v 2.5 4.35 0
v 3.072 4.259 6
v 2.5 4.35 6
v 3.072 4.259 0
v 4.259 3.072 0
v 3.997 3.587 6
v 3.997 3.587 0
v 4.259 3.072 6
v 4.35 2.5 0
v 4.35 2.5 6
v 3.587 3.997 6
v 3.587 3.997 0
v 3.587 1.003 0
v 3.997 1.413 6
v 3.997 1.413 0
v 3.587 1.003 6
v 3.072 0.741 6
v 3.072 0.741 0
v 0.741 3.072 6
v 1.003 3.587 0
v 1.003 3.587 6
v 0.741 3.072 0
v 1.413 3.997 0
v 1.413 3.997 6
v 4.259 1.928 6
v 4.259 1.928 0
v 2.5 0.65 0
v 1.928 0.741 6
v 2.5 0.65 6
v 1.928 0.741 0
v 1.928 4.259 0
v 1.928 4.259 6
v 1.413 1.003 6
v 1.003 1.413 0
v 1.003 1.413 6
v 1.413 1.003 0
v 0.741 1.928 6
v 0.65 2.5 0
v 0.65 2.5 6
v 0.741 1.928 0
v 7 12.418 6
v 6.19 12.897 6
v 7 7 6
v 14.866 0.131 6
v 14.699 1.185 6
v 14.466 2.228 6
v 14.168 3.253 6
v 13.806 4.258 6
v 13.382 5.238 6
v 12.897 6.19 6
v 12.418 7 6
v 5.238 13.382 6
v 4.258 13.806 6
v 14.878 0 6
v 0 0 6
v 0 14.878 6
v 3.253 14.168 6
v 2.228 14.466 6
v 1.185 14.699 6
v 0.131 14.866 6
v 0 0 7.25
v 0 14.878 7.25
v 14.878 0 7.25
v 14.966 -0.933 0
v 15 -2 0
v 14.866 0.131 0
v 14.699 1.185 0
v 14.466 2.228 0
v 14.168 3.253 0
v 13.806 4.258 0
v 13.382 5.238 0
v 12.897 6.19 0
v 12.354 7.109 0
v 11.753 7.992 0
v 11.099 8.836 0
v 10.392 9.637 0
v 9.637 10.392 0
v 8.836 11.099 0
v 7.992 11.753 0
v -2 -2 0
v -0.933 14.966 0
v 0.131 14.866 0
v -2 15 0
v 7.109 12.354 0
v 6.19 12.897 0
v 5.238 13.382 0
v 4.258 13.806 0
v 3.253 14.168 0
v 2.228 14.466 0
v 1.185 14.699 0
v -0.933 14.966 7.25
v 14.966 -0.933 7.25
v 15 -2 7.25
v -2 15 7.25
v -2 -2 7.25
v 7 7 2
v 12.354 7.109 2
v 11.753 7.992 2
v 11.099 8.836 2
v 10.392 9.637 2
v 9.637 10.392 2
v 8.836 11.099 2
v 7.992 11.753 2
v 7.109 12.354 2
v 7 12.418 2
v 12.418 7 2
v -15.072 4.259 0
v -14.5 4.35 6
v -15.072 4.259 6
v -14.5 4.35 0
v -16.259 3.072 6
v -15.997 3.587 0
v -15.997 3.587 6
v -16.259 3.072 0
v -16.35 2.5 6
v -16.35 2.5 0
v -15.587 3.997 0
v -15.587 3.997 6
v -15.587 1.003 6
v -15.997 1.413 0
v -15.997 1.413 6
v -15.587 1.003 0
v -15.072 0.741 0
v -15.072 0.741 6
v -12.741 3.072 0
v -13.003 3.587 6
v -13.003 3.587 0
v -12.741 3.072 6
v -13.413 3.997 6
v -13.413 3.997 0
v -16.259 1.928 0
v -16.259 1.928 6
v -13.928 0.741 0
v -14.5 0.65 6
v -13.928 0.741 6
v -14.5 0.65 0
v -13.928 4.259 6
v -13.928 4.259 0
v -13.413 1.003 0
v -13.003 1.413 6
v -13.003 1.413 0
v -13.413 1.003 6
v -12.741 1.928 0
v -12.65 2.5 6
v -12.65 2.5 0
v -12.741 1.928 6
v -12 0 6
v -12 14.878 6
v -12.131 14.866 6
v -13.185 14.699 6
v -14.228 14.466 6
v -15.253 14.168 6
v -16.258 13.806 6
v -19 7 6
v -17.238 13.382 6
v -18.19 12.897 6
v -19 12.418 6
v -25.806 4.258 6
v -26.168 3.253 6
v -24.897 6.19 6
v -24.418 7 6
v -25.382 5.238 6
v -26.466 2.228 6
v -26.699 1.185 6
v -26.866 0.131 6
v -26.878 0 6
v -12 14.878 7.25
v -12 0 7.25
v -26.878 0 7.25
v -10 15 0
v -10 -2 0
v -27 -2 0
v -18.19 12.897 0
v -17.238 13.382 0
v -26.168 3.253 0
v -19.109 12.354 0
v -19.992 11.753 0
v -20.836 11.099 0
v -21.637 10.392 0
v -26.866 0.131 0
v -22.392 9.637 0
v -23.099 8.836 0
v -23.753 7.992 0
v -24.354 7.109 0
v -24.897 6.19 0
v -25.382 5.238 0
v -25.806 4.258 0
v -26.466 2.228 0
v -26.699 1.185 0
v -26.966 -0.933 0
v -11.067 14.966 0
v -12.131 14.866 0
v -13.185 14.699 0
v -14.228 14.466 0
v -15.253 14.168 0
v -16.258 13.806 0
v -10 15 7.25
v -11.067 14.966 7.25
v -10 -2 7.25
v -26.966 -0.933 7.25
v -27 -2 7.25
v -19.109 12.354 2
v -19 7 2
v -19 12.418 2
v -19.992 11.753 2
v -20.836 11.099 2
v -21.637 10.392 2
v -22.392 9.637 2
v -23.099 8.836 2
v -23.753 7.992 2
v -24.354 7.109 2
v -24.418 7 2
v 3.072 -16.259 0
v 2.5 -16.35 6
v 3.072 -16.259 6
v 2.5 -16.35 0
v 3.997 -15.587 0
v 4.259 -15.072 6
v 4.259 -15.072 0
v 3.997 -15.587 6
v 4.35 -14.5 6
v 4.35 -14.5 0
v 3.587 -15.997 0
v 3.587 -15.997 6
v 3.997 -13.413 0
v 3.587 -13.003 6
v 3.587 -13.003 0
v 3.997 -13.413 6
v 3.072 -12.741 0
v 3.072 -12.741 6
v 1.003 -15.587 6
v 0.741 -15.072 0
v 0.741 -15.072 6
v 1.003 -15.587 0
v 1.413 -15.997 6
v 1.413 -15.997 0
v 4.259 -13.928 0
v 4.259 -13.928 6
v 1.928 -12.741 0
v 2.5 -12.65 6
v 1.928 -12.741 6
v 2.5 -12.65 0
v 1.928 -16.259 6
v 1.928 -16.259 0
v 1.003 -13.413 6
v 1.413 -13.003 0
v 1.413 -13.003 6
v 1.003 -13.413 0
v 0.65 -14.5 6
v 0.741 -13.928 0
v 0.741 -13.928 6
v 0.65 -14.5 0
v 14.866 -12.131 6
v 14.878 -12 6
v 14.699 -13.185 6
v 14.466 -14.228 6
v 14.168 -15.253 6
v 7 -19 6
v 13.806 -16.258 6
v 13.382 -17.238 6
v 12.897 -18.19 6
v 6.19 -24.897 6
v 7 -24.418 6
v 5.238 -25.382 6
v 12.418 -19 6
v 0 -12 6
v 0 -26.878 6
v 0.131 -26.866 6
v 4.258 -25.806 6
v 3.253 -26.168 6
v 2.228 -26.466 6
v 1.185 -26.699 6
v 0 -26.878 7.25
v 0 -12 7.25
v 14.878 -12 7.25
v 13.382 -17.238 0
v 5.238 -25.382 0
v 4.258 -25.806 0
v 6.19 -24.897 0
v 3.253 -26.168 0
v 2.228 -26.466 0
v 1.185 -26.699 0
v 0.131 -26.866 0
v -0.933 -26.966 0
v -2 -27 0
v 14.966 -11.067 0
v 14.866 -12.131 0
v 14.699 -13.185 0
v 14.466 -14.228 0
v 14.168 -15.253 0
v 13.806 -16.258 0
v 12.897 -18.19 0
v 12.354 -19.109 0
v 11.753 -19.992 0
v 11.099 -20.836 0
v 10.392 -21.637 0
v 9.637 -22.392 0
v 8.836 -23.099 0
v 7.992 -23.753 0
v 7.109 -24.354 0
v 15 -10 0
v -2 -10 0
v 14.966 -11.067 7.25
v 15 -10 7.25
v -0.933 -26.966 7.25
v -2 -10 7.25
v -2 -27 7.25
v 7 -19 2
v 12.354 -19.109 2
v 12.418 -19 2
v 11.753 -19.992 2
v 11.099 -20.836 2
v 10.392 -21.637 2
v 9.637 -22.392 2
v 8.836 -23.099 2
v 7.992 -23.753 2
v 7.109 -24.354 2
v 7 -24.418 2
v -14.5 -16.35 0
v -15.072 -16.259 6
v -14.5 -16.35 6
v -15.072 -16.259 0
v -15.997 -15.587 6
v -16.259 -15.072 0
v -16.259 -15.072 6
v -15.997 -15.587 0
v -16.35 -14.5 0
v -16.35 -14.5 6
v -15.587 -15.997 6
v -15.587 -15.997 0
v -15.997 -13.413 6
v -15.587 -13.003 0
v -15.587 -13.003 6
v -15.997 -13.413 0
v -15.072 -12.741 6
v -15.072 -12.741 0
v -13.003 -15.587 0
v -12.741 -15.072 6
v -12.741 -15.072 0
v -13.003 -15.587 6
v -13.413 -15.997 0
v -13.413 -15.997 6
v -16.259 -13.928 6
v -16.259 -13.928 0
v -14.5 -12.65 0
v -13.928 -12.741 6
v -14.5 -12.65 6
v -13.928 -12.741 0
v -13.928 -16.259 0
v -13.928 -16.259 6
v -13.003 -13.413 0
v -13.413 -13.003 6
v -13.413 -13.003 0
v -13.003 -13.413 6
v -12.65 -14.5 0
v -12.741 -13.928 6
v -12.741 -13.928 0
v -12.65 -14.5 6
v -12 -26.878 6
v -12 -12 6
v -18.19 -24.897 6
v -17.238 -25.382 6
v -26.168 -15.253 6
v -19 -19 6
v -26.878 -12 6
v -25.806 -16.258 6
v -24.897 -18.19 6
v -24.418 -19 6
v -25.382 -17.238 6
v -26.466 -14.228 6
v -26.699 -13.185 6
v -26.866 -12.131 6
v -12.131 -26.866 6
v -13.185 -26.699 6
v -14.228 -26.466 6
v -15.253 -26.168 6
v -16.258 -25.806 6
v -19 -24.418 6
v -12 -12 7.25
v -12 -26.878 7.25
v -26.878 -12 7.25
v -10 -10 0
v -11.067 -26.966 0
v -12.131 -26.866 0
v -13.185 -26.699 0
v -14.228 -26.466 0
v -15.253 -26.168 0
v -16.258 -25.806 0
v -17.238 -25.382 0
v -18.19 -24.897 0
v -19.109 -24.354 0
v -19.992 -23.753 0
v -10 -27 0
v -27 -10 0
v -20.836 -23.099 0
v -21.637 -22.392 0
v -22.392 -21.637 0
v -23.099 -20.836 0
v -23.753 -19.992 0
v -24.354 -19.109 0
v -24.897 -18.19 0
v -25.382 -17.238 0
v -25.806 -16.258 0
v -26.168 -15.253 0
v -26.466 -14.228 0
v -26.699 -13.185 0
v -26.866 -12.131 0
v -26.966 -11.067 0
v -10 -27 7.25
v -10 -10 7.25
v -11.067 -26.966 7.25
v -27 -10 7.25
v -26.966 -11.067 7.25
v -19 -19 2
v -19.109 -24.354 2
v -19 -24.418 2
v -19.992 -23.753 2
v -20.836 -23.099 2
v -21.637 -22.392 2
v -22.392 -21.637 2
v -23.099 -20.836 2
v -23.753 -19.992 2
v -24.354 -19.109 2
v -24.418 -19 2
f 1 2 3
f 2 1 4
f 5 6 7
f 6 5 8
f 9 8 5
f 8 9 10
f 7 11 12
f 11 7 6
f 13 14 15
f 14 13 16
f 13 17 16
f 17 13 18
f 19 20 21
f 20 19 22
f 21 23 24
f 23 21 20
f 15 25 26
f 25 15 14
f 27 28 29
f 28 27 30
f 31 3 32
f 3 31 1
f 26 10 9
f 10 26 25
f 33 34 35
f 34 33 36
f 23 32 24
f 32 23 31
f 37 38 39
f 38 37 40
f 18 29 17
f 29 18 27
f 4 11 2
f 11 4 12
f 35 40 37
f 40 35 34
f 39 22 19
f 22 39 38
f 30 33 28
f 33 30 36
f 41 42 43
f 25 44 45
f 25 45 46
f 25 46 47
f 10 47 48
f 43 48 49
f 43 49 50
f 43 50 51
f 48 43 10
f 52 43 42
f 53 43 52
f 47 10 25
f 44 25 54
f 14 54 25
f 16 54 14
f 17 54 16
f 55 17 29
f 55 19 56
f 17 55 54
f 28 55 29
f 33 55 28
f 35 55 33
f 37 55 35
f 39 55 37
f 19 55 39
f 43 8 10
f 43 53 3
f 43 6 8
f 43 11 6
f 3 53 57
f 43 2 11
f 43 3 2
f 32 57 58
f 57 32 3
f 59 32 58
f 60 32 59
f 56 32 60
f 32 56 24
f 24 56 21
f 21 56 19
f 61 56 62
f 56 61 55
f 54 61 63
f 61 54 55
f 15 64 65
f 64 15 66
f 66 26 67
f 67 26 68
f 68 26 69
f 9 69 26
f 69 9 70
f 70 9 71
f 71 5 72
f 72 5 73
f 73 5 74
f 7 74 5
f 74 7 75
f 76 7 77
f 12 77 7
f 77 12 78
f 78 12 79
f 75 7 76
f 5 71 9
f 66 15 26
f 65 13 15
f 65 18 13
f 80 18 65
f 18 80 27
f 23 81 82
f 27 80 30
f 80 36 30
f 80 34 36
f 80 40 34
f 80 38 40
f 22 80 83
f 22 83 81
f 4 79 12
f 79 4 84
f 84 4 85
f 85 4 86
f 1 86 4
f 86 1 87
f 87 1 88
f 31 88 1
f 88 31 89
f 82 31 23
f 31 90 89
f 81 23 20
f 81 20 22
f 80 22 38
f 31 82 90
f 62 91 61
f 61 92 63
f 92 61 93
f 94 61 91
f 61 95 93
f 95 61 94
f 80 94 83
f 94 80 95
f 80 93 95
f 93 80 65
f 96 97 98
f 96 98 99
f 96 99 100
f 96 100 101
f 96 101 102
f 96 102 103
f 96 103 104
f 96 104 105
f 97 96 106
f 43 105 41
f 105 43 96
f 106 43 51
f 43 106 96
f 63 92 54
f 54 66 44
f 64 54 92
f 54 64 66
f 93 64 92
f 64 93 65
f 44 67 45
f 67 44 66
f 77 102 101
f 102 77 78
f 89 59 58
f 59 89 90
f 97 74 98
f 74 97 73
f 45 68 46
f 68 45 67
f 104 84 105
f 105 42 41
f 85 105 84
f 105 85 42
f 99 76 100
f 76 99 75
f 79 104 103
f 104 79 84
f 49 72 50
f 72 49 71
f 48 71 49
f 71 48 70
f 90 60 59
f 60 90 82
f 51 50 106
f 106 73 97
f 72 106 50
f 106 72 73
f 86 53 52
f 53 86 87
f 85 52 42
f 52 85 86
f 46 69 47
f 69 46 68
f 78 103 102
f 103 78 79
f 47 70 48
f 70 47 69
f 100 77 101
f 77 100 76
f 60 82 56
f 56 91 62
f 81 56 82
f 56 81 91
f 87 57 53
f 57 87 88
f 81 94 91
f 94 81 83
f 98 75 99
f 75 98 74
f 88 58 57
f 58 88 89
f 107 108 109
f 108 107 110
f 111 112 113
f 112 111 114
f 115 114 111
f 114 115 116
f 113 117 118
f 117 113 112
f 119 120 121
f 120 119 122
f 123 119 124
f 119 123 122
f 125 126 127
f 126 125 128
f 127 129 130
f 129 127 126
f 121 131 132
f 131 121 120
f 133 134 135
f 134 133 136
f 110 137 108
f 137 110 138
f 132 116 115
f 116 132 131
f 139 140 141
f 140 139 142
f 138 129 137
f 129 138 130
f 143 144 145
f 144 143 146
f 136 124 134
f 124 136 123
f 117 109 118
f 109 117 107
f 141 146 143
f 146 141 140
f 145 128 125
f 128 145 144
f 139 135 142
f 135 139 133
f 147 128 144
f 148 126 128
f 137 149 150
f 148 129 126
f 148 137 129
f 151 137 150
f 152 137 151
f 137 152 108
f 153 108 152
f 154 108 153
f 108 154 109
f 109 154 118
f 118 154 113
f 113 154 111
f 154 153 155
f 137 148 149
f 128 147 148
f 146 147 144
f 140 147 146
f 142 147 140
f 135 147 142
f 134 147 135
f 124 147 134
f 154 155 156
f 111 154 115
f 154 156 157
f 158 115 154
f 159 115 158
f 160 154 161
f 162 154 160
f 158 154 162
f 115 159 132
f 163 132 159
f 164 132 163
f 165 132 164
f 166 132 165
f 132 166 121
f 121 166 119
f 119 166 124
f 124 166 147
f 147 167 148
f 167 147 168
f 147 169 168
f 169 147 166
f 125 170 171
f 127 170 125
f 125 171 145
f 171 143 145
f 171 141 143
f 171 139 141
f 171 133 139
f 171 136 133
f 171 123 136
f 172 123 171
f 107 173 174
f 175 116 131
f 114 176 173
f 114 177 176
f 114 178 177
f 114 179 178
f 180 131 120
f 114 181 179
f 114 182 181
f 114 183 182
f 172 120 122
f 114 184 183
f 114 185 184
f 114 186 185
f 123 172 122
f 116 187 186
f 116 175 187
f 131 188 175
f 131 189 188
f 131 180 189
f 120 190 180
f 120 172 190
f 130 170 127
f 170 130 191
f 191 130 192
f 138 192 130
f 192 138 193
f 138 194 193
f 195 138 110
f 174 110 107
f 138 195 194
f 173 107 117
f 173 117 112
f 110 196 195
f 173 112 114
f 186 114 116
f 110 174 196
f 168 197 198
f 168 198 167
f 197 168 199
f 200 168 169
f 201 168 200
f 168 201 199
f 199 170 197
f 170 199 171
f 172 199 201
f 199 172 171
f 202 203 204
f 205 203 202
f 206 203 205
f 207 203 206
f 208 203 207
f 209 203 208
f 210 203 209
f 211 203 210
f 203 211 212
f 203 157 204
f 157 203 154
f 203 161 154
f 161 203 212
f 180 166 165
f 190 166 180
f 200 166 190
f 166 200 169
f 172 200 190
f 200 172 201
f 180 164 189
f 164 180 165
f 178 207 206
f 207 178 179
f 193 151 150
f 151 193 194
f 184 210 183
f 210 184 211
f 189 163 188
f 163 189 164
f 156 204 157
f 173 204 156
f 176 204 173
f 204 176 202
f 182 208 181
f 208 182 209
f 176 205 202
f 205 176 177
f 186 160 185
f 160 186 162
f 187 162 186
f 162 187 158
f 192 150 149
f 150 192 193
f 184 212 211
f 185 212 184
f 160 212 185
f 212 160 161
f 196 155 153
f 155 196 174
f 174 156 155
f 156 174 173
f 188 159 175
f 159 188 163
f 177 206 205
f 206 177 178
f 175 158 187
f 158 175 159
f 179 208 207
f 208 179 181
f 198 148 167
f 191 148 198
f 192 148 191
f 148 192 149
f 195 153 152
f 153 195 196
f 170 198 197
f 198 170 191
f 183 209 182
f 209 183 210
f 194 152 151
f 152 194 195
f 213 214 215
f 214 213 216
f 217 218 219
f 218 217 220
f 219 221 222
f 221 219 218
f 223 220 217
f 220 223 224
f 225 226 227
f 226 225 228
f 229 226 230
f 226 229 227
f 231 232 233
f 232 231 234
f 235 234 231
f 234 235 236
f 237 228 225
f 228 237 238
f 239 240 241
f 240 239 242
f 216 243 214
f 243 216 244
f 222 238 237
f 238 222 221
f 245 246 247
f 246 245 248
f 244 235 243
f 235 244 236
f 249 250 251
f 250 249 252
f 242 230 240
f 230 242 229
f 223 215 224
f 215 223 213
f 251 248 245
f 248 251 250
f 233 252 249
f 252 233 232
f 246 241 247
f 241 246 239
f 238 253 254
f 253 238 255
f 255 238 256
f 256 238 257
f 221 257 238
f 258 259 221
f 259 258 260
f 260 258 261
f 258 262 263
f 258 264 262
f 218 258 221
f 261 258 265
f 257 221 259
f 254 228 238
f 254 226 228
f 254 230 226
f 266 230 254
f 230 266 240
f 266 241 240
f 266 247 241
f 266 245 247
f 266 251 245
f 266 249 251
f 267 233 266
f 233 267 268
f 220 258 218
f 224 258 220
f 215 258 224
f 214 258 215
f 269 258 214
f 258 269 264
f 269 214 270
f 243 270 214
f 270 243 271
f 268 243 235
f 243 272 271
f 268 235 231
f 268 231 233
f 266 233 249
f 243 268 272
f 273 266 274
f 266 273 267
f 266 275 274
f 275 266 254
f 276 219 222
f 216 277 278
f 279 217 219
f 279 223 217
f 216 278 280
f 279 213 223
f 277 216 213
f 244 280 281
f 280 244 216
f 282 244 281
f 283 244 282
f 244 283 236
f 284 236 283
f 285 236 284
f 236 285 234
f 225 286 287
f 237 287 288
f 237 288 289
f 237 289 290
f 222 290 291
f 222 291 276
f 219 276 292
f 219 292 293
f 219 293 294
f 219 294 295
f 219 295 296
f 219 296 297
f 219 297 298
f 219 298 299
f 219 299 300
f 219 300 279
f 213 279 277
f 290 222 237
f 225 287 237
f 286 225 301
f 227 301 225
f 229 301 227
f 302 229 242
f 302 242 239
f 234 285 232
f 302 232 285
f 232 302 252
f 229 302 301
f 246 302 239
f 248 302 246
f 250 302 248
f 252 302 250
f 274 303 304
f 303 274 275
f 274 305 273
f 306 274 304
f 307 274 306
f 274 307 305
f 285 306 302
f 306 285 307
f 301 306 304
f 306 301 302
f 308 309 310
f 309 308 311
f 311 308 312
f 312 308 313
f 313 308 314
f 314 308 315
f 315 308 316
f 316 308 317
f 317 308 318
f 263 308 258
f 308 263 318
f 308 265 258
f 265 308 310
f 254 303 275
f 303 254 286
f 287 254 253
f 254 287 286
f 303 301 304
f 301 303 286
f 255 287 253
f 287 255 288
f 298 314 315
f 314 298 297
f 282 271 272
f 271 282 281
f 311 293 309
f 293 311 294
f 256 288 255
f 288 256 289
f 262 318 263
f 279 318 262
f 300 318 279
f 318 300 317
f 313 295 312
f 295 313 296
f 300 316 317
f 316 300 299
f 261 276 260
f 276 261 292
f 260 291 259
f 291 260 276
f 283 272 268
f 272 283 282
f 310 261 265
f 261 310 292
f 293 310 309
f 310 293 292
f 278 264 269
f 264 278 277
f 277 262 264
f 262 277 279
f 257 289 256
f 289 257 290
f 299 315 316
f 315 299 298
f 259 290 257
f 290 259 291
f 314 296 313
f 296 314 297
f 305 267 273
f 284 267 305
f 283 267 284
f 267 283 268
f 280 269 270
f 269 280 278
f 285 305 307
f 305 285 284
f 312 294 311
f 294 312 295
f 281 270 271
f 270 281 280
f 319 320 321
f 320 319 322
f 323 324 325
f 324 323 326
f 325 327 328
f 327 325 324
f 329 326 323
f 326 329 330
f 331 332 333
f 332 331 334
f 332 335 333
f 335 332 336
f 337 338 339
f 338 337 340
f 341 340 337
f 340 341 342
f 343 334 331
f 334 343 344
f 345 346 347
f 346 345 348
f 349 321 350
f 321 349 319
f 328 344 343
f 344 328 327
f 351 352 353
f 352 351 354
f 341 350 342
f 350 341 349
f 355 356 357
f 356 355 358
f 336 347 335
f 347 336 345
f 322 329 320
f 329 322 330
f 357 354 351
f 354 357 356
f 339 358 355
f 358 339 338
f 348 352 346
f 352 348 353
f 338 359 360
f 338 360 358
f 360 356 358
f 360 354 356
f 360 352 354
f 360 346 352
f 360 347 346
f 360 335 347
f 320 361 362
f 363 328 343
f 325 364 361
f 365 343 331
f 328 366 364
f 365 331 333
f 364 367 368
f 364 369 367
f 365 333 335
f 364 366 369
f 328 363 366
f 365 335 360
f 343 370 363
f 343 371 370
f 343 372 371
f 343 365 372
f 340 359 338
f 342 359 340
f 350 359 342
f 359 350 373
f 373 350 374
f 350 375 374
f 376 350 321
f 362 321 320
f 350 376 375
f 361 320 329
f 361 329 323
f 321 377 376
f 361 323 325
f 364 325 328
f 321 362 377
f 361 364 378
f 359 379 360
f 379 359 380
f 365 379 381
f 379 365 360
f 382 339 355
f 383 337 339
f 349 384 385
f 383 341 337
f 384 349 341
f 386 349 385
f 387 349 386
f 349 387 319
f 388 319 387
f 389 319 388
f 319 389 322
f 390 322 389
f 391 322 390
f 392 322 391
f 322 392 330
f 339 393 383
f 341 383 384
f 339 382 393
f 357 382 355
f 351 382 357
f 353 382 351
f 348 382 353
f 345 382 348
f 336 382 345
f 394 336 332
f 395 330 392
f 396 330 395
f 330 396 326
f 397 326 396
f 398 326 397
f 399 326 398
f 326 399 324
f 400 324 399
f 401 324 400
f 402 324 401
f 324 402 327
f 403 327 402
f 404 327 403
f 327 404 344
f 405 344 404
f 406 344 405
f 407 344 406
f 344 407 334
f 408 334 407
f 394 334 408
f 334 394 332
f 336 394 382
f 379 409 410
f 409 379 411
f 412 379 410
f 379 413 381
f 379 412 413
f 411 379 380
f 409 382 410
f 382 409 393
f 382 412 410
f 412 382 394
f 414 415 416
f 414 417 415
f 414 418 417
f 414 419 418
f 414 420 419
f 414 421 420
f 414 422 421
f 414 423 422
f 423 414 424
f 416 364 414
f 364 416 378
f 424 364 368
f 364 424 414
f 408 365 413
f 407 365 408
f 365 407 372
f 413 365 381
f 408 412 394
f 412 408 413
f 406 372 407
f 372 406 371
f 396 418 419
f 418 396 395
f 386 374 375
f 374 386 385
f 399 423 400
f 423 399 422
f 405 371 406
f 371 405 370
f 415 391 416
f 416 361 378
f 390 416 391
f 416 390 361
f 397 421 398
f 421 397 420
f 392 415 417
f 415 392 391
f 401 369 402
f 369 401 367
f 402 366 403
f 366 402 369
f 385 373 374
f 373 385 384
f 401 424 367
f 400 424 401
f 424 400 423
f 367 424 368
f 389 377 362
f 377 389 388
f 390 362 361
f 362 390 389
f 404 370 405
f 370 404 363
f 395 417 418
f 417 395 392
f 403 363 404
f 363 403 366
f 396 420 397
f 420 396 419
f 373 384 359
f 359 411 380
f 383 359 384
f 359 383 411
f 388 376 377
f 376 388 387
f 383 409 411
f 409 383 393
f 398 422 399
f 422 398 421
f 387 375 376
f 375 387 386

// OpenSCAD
/* [HeatedBed] */

hotBedThickness = 2.5;
hotBedSizeX = 214; 
hotBedSizeY = 214; 
hotBedMountPointX = 2.5;
hotBedMountPointY = 2.5;
hotBedMountPointDiameter = 3.7;

/* [Glass] */

glassThickness = 4;
glassSizeX = 200;
glassSizeY = 200; 

/* [Mount] */

mountTopThickness = 2;
mountBorderThickness = 2;
mountGlassBorderThickness = 4;
mountSize = 15;


/* [Hidden] */

hotBedBoltLength = 20;

// Calculations
hotBedMountPoints = [[hotBedMountPointX,hotBedMountPointY,0],
							[hotBedMountPointX,hotBedSizeY-hotBedMountPointY,0],
							[hotBedSizeX-hotBedMountPointX,hotBedSizeY-hotBedMountPointY,0],
							[hotBedSizeX-hotBedMountPointX,hotBedMountPointY,0]];

// Hot Bed
module HotBed(){
	difference() {
		color("OrangeRed", 1) 
			cube([hotBedSizeX, hotBedSizeY, hotBedThickness]);
		HotBedBolts();
/*
		for (i = hotBedMountPoints)
		{
			translate(i) 
				cylinder(h=hotBedThickness,r=hotBedMountPointDiameter/2, $fn=10);
		}
*/
	}
}

module HotBedBolts(){
	for (i = hotBedMountPoints)
	{
		translate(i+[0,0,-5]) 
			cylinder(h=hotBedThickness+glassThickness+10,r=hotBedMountPointDiameter/2, $fn=20);
	}
}

module Glass() {
	glassPosition = [(hotBedSizeX-glassSizeX)/2,(hotBedSizeY-glassSizeY)/2,hotBedThickness];
	color("Azure",0.7) 
		translate(glassPosition) cube([glassSizeX, glassSizeY, glassThickness]);
}

module GlassMount() {
	mountTotalHeight=hotBedThickness/2+glassThickness+mountTopThickness;
	mountPosition=[-mountBorderThickness,-mountBorderThickness,hotBedThickness/2];
	intersection() {
	difference(){
		translate(mountPosition) 
			color("Blue")
				cube([mountSize+mountBorderThickness,mountSize+mountBorderThickness,mountTotalHeight]);	
		HotBed();
		HotBedBolts();
		Glass();
		// Substract top piece
	//	translate([mountGlassBorderThickness,mountGlassBorderThickness,mountTopThickness]) Glass();
		// Triangle
	}
		translate(mountPosition)cylinder(h=mountTotalHeight,r=mountSize+mountBorderThickness,$fn=100);
	}
}
 
//HotBed();
//HotBedBolts();
//Glass();
//GlassMount();

module GlassMountPair() {
	translate([0,0,glassThickness + hotBedThickness + mountTopThickness])
	mirror([0,0,90]){
		GlassMount();
		translate([-10-mountBorderThickness, 0, 0]) mirror() GlassMount();
	}
}

GlassMountPair();
translate([0, -10-mountBorderThickness, 0]) mirror([0,1,0]) GlassMountPair();
